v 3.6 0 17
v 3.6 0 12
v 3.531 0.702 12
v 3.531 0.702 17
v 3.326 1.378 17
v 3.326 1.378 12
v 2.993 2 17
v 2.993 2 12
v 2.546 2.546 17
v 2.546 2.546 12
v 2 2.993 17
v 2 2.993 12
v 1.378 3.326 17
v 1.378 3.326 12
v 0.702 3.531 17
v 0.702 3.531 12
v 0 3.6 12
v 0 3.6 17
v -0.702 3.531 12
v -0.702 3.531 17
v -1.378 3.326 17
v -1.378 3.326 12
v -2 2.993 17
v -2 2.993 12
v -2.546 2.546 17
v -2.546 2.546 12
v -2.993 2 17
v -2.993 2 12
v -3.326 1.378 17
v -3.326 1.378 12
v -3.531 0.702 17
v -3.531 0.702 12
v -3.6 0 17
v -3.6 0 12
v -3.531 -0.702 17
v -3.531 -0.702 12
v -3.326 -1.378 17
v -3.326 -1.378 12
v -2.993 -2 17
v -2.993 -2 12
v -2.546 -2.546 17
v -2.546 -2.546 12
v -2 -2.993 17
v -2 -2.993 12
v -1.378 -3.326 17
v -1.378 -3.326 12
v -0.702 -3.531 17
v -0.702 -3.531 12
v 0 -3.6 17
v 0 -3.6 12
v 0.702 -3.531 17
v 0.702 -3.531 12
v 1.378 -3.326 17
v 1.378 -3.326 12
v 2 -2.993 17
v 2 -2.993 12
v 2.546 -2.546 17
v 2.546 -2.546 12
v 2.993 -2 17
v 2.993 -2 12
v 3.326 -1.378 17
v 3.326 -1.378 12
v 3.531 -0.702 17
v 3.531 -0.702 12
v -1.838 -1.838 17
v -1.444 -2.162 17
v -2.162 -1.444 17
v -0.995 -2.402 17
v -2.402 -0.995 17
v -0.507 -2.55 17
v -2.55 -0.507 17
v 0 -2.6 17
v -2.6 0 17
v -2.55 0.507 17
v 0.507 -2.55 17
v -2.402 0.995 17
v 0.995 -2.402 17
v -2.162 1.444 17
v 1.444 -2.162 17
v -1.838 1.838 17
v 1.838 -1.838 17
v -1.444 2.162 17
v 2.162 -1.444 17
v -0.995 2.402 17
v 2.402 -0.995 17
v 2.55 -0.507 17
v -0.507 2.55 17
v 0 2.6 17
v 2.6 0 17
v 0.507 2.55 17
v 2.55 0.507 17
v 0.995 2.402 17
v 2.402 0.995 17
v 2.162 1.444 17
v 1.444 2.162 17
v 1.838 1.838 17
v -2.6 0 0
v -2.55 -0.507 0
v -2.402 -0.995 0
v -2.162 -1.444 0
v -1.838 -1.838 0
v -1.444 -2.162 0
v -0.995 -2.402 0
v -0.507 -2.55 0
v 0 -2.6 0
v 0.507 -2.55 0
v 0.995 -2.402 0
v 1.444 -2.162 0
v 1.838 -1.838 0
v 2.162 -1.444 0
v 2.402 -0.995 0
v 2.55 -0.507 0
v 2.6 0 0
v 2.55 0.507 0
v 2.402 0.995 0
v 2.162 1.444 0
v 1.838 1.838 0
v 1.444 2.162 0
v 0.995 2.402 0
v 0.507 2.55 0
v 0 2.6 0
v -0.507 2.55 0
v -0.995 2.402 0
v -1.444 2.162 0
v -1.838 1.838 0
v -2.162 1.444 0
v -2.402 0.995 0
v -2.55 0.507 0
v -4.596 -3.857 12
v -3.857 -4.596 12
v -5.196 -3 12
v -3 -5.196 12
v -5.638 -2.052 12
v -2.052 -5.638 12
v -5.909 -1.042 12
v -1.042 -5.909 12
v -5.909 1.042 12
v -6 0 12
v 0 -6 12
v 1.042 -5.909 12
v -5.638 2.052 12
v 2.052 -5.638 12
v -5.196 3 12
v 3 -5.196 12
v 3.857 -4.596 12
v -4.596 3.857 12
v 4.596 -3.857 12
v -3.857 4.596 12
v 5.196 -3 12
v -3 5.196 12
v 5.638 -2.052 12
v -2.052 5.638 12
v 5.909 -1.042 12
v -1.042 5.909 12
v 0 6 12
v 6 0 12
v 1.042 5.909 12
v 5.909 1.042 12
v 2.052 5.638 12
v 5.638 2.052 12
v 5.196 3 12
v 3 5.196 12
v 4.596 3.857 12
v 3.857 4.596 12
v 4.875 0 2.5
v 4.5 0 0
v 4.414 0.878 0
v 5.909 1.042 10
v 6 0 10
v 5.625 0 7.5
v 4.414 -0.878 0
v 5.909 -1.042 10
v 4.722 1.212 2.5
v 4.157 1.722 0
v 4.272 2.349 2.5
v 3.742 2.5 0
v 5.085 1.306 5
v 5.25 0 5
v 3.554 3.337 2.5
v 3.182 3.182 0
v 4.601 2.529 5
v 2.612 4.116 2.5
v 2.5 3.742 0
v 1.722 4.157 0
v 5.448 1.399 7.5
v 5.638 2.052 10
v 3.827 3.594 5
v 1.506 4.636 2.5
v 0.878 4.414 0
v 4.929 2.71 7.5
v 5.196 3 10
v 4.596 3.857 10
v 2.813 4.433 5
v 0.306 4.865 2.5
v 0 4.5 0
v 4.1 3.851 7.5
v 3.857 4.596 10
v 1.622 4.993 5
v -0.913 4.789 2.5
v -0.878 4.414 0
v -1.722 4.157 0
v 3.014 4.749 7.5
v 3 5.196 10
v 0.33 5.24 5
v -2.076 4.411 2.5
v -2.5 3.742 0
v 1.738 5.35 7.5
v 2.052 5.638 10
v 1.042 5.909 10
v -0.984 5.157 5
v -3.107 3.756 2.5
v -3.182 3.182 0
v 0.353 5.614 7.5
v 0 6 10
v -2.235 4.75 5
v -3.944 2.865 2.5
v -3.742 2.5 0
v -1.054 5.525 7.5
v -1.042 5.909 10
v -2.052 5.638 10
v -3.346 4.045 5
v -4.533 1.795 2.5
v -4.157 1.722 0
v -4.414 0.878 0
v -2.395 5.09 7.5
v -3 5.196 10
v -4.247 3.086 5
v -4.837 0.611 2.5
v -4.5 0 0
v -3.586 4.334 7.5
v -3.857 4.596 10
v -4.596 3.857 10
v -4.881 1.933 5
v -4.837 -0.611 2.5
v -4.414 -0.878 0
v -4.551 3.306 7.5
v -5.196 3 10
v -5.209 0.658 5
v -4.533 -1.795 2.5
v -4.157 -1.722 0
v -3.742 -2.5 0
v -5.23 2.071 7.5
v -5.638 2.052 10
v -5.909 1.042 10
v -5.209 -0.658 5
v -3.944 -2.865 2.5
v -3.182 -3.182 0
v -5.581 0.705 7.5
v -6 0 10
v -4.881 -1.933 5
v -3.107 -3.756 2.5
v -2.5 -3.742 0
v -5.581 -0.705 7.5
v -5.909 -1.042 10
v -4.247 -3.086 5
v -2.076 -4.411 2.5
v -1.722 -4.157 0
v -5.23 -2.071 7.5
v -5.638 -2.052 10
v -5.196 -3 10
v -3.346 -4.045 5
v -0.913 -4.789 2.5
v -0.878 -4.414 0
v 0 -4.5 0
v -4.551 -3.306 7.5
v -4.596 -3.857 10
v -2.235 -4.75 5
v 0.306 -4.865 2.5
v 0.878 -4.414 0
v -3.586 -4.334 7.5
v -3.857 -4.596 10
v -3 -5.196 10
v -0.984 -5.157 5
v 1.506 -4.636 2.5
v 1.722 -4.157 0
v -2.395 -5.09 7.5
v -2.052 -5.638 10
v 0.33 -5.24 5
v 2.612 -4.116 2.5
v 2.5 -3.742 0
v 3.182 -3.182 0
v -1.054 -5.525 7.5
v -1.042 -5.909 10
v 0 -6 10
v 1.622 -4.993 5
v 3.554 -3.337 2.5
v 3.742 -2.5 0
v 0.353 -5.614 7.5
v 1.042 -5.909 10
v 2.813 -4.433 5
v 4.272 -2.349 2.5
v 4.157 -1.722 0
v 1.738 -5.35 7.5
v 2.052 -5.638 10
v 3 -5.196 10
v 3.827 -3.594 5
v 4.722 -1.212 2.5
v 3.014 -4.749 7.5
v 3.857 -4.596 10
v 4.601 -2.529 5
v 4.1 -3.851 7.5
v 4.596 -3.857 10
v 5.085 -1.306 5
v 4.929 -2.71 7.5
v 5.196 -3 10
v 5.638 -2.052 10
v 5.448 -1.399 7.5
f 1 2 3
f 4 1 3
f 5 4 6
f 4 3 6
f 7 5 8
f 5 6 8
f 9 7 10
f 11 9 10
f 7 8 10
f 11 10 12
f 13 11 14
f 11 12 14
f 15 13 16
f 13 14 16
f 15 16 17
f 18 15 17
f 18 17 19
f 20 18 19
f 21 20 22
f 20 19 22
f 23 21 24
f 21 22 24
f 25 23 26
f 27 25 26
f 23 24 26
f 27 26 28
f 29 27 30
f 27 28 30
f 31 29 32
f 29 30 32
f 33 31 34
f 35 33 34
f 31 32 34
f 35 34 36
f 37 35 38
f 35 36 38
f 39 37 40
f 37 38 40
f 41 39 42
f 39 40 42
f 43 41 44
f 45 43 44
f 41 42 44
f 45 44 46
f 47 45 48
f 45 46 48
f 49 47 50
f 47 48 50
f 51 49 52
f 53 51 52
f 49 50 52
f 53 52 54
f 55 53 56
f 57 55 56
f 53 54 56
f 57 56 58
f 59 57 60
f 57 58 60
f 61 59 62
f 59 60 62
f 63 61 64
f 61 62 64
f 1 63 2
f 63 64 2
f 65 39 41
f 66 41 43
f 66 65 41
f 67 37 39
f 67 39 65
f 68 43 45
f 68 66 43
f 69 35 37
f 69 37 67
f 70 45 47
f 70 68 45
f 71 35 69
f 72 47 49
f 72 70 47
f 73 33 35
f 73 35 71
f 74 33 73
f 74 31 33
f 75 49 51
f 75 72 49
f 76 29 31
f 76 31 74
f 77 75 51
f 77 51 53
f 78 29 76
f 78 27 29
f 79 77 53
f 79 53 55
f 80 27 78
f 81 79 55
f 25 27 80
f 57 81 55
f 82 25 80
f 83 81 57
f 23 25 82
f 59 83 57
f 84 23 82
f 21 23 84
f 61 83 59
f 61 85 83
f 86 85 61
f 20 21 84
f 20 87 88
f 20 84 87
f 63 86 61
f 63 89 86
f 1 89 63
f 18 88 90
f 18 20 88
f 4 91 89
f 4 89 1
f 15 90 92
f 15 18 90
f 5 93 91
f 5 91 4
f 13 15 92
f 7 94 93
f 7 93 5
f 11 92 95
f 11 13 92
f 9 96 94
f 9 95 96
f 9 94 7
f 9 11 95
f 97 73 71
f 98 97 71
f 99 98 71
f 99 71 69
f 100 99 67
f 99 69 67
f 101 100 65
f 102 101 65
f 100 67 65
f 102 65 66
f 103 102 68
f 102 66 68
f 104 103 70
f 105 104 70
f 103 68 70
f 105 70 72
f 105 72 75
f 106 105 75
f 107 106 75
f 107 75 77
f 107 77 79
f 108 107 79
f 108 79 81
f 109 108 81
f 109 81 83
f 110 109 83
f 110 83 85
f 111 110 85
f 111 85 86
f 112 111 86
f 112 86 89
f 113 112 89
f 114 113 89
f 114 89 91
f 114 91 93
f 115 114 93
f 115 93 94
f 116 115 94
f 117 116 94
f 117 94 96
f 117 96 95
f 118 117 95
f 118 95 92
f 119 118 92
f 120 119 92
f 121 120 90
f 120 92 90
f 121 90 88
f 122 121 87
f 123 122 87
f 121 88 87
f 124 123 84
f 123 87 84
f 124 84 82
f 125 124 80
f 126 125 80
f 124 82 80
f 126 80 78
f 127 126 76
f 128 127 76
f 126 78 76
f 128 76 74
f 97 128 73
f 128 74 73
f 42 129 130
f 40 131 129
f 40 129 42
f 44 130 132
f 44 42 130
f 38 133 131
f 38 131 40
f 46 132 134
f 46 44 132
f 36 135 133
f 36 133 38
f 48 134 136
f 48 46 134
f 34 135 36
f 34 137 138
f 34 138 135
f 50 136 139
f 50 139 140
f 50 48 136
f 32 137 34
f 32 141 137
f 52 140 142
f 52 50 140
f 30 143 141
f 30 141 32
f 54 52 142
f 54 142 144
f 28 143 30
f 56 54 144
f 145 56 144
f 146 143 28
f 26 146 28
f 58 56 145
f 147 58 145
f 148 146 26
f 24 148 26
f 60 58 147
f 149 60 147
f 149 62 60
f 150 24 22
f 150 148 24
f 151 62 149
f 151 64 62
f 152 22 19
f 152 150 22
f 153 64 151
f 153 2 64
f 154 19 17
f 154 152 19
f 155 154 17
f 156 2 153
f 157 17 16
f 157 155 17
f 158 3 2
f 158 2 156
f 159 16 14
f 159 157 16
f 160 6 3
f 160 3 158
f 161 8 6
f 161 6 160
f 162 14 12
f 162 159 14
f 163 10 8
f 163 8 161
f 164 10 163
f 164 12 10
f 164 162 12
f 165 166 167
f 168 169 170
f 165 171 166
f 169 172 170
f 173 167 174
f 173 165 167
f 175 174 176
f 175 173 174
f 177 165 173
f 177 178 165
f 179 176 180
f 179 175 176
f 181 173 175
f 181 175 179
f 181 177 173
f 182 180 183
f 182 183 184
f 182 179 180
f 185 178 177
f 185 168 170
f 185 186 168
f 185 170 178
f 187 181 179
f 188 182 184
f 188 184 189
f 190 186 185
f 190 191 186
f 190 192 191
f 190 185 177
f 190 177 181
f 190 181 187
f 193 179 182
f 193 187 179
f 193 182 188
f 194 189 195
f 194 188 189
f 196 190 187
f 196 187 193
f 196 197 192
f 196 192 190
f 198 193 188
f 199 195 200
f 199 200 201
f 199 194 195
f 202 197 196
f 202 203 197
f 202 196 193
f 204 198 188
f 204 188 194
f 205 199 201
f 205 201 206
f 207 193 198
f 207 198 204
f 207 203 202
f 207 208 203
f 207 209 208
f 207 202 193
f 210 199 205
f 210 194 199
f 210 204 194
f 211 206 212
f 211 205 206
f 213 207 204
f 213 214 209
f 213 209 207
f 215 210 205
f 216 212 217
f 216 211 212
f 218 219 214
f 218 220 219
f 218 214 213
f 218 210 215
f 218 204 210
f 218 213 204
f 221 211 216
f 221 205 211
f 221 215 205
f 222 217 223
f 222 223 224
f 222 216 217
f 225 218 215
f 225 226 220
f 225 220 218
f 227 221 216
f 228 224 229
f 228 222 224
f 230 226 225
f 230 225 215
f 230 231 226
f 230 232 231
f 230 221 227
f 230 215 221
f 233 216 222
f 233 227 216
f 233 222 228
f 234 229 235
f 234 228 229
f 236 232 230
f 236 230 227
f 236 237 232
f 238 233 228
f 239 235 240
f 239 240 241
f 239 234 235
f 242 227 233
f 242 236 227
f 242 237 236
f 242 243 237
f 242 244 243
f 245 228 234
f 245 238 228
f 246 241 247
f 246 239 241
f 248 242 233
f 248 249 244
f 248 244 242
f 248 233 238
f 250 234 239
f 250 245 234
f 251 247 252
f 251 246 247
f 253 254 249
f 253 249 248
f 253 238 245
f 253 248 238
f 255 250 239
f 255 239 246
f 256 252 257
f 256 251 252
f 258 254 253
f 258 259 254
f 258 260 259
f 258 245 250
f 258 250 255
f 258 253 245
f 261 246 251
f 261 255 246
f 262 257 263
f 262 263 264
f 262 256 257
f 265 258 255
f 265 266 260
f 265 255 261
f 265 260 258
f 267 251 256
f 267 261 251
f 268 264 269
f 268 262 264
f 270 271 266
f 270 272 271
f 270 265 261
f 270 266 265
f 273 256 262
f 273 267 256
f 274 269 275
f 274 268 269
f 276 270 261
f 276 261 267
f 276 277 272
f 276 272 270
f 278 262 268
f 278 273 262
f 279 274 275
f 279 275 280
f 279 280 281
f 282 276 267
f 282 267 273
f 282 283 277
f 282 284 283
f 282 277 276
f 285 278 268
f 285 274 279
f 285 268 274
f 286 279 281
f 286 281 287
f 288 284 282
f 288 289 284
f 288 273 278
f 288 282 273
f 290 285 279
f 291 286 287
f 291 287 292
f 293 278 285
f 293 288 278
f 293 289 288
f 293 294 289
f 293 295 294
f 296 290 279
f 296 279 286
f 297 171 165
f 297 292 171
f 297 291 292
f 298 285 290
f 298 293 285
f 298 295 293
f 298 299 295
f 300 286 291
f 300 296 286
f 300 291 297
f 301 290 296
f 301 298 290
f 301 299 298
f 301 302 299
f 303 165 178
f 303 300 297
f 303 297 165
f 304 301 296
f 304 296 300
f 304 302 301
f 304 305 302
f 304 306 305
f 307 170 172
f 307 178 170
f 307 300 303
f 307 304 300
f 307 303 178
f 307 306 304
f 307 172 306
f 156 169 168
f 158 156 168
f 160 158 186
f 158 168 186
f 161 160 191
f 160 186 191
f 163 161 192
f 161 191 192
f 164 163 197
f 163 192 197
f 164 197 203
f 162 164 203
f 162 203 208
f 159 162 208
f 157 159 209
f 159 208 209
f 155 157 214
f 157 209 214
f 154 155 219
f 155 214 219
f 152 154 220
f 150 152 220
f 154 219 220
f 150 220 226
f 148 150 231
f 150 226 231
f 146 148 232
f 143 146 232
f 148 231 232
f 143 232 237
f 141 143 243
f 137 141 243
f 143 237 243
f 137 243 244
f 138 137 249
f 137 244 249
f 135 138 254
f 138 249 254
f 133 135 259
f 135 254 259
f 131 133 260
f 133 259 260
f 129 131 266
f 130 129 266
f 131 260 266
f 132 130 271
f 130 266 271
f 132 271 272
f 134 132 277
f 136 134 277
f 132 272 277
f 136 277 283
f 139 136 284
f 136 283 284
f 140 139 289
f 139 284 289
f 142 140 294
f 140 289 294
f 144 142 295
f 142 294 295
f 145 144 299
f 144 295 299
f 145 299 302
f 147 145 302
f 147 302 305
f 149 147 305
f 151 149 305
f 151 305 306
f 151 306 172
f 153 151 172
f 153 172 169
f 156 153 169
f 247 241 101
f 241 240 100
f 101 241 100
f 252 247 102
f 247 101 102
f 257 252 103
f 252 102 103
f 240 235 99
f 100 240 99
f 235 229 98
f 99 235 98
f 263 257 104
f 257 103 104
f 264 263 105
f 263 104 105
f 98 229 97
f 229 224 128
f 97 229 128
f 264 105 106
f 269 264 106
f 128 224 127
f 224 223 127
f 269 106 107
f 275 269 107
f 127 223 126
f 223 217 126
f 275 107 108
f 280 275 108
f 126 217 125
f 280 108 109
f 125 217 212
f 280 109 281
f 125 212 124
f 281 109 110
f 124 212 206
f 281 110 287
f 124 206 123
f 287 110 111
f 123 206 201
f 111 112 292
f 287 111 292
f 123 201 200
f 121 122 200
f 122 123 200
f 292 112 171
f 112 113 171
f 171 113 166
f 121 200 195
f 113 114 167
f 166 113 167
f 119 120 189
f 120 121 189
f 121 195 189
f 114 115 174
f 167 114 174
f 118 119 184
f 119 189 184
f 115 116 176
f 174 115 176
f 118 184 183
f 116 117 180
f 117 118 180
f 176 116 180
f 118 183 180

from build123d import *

# Parameters (mm, degrees)
F0_R     = 4.5
F2_R     = 6
F4_DEPTH = 2
F5_R     = 3.6
F6_DEPTH = 5
F7_D     = 5.2


with BuildPart() as f3:
    # F0 (on Top) → F3 section 0
    with BuildSketch(Plane.XY):
        Circle(F0_R)
    # F2 (on offset) → F3 section 1
    with BuildSketch(Plane.XY.offset(10)):
        Circle(F2_R)
    loft()

    # F4 (add): a face of the model
    f4_faces = [f3.faces().sort_by_distance(p)[0] for p in [
        (0, 0, 10),
    ]]
    extrude(f4_faces, amount=F4_DEPTH)

    # F5 (on face) → F6 (join)
    with BuildSketch(Plane.XY.offset(12)):
        Circle(F5_R)
    extrude(amount=F6_DEPTH)

    # F7 (through all)
    with Locations(Plane(origin=(0, 0, 0), x_dir=(1, 0, 0), z_dir=(0, 0, -1))):
        with Locations((0, 0)):
            Hole(F7_D / 2)


solid = f3.part
